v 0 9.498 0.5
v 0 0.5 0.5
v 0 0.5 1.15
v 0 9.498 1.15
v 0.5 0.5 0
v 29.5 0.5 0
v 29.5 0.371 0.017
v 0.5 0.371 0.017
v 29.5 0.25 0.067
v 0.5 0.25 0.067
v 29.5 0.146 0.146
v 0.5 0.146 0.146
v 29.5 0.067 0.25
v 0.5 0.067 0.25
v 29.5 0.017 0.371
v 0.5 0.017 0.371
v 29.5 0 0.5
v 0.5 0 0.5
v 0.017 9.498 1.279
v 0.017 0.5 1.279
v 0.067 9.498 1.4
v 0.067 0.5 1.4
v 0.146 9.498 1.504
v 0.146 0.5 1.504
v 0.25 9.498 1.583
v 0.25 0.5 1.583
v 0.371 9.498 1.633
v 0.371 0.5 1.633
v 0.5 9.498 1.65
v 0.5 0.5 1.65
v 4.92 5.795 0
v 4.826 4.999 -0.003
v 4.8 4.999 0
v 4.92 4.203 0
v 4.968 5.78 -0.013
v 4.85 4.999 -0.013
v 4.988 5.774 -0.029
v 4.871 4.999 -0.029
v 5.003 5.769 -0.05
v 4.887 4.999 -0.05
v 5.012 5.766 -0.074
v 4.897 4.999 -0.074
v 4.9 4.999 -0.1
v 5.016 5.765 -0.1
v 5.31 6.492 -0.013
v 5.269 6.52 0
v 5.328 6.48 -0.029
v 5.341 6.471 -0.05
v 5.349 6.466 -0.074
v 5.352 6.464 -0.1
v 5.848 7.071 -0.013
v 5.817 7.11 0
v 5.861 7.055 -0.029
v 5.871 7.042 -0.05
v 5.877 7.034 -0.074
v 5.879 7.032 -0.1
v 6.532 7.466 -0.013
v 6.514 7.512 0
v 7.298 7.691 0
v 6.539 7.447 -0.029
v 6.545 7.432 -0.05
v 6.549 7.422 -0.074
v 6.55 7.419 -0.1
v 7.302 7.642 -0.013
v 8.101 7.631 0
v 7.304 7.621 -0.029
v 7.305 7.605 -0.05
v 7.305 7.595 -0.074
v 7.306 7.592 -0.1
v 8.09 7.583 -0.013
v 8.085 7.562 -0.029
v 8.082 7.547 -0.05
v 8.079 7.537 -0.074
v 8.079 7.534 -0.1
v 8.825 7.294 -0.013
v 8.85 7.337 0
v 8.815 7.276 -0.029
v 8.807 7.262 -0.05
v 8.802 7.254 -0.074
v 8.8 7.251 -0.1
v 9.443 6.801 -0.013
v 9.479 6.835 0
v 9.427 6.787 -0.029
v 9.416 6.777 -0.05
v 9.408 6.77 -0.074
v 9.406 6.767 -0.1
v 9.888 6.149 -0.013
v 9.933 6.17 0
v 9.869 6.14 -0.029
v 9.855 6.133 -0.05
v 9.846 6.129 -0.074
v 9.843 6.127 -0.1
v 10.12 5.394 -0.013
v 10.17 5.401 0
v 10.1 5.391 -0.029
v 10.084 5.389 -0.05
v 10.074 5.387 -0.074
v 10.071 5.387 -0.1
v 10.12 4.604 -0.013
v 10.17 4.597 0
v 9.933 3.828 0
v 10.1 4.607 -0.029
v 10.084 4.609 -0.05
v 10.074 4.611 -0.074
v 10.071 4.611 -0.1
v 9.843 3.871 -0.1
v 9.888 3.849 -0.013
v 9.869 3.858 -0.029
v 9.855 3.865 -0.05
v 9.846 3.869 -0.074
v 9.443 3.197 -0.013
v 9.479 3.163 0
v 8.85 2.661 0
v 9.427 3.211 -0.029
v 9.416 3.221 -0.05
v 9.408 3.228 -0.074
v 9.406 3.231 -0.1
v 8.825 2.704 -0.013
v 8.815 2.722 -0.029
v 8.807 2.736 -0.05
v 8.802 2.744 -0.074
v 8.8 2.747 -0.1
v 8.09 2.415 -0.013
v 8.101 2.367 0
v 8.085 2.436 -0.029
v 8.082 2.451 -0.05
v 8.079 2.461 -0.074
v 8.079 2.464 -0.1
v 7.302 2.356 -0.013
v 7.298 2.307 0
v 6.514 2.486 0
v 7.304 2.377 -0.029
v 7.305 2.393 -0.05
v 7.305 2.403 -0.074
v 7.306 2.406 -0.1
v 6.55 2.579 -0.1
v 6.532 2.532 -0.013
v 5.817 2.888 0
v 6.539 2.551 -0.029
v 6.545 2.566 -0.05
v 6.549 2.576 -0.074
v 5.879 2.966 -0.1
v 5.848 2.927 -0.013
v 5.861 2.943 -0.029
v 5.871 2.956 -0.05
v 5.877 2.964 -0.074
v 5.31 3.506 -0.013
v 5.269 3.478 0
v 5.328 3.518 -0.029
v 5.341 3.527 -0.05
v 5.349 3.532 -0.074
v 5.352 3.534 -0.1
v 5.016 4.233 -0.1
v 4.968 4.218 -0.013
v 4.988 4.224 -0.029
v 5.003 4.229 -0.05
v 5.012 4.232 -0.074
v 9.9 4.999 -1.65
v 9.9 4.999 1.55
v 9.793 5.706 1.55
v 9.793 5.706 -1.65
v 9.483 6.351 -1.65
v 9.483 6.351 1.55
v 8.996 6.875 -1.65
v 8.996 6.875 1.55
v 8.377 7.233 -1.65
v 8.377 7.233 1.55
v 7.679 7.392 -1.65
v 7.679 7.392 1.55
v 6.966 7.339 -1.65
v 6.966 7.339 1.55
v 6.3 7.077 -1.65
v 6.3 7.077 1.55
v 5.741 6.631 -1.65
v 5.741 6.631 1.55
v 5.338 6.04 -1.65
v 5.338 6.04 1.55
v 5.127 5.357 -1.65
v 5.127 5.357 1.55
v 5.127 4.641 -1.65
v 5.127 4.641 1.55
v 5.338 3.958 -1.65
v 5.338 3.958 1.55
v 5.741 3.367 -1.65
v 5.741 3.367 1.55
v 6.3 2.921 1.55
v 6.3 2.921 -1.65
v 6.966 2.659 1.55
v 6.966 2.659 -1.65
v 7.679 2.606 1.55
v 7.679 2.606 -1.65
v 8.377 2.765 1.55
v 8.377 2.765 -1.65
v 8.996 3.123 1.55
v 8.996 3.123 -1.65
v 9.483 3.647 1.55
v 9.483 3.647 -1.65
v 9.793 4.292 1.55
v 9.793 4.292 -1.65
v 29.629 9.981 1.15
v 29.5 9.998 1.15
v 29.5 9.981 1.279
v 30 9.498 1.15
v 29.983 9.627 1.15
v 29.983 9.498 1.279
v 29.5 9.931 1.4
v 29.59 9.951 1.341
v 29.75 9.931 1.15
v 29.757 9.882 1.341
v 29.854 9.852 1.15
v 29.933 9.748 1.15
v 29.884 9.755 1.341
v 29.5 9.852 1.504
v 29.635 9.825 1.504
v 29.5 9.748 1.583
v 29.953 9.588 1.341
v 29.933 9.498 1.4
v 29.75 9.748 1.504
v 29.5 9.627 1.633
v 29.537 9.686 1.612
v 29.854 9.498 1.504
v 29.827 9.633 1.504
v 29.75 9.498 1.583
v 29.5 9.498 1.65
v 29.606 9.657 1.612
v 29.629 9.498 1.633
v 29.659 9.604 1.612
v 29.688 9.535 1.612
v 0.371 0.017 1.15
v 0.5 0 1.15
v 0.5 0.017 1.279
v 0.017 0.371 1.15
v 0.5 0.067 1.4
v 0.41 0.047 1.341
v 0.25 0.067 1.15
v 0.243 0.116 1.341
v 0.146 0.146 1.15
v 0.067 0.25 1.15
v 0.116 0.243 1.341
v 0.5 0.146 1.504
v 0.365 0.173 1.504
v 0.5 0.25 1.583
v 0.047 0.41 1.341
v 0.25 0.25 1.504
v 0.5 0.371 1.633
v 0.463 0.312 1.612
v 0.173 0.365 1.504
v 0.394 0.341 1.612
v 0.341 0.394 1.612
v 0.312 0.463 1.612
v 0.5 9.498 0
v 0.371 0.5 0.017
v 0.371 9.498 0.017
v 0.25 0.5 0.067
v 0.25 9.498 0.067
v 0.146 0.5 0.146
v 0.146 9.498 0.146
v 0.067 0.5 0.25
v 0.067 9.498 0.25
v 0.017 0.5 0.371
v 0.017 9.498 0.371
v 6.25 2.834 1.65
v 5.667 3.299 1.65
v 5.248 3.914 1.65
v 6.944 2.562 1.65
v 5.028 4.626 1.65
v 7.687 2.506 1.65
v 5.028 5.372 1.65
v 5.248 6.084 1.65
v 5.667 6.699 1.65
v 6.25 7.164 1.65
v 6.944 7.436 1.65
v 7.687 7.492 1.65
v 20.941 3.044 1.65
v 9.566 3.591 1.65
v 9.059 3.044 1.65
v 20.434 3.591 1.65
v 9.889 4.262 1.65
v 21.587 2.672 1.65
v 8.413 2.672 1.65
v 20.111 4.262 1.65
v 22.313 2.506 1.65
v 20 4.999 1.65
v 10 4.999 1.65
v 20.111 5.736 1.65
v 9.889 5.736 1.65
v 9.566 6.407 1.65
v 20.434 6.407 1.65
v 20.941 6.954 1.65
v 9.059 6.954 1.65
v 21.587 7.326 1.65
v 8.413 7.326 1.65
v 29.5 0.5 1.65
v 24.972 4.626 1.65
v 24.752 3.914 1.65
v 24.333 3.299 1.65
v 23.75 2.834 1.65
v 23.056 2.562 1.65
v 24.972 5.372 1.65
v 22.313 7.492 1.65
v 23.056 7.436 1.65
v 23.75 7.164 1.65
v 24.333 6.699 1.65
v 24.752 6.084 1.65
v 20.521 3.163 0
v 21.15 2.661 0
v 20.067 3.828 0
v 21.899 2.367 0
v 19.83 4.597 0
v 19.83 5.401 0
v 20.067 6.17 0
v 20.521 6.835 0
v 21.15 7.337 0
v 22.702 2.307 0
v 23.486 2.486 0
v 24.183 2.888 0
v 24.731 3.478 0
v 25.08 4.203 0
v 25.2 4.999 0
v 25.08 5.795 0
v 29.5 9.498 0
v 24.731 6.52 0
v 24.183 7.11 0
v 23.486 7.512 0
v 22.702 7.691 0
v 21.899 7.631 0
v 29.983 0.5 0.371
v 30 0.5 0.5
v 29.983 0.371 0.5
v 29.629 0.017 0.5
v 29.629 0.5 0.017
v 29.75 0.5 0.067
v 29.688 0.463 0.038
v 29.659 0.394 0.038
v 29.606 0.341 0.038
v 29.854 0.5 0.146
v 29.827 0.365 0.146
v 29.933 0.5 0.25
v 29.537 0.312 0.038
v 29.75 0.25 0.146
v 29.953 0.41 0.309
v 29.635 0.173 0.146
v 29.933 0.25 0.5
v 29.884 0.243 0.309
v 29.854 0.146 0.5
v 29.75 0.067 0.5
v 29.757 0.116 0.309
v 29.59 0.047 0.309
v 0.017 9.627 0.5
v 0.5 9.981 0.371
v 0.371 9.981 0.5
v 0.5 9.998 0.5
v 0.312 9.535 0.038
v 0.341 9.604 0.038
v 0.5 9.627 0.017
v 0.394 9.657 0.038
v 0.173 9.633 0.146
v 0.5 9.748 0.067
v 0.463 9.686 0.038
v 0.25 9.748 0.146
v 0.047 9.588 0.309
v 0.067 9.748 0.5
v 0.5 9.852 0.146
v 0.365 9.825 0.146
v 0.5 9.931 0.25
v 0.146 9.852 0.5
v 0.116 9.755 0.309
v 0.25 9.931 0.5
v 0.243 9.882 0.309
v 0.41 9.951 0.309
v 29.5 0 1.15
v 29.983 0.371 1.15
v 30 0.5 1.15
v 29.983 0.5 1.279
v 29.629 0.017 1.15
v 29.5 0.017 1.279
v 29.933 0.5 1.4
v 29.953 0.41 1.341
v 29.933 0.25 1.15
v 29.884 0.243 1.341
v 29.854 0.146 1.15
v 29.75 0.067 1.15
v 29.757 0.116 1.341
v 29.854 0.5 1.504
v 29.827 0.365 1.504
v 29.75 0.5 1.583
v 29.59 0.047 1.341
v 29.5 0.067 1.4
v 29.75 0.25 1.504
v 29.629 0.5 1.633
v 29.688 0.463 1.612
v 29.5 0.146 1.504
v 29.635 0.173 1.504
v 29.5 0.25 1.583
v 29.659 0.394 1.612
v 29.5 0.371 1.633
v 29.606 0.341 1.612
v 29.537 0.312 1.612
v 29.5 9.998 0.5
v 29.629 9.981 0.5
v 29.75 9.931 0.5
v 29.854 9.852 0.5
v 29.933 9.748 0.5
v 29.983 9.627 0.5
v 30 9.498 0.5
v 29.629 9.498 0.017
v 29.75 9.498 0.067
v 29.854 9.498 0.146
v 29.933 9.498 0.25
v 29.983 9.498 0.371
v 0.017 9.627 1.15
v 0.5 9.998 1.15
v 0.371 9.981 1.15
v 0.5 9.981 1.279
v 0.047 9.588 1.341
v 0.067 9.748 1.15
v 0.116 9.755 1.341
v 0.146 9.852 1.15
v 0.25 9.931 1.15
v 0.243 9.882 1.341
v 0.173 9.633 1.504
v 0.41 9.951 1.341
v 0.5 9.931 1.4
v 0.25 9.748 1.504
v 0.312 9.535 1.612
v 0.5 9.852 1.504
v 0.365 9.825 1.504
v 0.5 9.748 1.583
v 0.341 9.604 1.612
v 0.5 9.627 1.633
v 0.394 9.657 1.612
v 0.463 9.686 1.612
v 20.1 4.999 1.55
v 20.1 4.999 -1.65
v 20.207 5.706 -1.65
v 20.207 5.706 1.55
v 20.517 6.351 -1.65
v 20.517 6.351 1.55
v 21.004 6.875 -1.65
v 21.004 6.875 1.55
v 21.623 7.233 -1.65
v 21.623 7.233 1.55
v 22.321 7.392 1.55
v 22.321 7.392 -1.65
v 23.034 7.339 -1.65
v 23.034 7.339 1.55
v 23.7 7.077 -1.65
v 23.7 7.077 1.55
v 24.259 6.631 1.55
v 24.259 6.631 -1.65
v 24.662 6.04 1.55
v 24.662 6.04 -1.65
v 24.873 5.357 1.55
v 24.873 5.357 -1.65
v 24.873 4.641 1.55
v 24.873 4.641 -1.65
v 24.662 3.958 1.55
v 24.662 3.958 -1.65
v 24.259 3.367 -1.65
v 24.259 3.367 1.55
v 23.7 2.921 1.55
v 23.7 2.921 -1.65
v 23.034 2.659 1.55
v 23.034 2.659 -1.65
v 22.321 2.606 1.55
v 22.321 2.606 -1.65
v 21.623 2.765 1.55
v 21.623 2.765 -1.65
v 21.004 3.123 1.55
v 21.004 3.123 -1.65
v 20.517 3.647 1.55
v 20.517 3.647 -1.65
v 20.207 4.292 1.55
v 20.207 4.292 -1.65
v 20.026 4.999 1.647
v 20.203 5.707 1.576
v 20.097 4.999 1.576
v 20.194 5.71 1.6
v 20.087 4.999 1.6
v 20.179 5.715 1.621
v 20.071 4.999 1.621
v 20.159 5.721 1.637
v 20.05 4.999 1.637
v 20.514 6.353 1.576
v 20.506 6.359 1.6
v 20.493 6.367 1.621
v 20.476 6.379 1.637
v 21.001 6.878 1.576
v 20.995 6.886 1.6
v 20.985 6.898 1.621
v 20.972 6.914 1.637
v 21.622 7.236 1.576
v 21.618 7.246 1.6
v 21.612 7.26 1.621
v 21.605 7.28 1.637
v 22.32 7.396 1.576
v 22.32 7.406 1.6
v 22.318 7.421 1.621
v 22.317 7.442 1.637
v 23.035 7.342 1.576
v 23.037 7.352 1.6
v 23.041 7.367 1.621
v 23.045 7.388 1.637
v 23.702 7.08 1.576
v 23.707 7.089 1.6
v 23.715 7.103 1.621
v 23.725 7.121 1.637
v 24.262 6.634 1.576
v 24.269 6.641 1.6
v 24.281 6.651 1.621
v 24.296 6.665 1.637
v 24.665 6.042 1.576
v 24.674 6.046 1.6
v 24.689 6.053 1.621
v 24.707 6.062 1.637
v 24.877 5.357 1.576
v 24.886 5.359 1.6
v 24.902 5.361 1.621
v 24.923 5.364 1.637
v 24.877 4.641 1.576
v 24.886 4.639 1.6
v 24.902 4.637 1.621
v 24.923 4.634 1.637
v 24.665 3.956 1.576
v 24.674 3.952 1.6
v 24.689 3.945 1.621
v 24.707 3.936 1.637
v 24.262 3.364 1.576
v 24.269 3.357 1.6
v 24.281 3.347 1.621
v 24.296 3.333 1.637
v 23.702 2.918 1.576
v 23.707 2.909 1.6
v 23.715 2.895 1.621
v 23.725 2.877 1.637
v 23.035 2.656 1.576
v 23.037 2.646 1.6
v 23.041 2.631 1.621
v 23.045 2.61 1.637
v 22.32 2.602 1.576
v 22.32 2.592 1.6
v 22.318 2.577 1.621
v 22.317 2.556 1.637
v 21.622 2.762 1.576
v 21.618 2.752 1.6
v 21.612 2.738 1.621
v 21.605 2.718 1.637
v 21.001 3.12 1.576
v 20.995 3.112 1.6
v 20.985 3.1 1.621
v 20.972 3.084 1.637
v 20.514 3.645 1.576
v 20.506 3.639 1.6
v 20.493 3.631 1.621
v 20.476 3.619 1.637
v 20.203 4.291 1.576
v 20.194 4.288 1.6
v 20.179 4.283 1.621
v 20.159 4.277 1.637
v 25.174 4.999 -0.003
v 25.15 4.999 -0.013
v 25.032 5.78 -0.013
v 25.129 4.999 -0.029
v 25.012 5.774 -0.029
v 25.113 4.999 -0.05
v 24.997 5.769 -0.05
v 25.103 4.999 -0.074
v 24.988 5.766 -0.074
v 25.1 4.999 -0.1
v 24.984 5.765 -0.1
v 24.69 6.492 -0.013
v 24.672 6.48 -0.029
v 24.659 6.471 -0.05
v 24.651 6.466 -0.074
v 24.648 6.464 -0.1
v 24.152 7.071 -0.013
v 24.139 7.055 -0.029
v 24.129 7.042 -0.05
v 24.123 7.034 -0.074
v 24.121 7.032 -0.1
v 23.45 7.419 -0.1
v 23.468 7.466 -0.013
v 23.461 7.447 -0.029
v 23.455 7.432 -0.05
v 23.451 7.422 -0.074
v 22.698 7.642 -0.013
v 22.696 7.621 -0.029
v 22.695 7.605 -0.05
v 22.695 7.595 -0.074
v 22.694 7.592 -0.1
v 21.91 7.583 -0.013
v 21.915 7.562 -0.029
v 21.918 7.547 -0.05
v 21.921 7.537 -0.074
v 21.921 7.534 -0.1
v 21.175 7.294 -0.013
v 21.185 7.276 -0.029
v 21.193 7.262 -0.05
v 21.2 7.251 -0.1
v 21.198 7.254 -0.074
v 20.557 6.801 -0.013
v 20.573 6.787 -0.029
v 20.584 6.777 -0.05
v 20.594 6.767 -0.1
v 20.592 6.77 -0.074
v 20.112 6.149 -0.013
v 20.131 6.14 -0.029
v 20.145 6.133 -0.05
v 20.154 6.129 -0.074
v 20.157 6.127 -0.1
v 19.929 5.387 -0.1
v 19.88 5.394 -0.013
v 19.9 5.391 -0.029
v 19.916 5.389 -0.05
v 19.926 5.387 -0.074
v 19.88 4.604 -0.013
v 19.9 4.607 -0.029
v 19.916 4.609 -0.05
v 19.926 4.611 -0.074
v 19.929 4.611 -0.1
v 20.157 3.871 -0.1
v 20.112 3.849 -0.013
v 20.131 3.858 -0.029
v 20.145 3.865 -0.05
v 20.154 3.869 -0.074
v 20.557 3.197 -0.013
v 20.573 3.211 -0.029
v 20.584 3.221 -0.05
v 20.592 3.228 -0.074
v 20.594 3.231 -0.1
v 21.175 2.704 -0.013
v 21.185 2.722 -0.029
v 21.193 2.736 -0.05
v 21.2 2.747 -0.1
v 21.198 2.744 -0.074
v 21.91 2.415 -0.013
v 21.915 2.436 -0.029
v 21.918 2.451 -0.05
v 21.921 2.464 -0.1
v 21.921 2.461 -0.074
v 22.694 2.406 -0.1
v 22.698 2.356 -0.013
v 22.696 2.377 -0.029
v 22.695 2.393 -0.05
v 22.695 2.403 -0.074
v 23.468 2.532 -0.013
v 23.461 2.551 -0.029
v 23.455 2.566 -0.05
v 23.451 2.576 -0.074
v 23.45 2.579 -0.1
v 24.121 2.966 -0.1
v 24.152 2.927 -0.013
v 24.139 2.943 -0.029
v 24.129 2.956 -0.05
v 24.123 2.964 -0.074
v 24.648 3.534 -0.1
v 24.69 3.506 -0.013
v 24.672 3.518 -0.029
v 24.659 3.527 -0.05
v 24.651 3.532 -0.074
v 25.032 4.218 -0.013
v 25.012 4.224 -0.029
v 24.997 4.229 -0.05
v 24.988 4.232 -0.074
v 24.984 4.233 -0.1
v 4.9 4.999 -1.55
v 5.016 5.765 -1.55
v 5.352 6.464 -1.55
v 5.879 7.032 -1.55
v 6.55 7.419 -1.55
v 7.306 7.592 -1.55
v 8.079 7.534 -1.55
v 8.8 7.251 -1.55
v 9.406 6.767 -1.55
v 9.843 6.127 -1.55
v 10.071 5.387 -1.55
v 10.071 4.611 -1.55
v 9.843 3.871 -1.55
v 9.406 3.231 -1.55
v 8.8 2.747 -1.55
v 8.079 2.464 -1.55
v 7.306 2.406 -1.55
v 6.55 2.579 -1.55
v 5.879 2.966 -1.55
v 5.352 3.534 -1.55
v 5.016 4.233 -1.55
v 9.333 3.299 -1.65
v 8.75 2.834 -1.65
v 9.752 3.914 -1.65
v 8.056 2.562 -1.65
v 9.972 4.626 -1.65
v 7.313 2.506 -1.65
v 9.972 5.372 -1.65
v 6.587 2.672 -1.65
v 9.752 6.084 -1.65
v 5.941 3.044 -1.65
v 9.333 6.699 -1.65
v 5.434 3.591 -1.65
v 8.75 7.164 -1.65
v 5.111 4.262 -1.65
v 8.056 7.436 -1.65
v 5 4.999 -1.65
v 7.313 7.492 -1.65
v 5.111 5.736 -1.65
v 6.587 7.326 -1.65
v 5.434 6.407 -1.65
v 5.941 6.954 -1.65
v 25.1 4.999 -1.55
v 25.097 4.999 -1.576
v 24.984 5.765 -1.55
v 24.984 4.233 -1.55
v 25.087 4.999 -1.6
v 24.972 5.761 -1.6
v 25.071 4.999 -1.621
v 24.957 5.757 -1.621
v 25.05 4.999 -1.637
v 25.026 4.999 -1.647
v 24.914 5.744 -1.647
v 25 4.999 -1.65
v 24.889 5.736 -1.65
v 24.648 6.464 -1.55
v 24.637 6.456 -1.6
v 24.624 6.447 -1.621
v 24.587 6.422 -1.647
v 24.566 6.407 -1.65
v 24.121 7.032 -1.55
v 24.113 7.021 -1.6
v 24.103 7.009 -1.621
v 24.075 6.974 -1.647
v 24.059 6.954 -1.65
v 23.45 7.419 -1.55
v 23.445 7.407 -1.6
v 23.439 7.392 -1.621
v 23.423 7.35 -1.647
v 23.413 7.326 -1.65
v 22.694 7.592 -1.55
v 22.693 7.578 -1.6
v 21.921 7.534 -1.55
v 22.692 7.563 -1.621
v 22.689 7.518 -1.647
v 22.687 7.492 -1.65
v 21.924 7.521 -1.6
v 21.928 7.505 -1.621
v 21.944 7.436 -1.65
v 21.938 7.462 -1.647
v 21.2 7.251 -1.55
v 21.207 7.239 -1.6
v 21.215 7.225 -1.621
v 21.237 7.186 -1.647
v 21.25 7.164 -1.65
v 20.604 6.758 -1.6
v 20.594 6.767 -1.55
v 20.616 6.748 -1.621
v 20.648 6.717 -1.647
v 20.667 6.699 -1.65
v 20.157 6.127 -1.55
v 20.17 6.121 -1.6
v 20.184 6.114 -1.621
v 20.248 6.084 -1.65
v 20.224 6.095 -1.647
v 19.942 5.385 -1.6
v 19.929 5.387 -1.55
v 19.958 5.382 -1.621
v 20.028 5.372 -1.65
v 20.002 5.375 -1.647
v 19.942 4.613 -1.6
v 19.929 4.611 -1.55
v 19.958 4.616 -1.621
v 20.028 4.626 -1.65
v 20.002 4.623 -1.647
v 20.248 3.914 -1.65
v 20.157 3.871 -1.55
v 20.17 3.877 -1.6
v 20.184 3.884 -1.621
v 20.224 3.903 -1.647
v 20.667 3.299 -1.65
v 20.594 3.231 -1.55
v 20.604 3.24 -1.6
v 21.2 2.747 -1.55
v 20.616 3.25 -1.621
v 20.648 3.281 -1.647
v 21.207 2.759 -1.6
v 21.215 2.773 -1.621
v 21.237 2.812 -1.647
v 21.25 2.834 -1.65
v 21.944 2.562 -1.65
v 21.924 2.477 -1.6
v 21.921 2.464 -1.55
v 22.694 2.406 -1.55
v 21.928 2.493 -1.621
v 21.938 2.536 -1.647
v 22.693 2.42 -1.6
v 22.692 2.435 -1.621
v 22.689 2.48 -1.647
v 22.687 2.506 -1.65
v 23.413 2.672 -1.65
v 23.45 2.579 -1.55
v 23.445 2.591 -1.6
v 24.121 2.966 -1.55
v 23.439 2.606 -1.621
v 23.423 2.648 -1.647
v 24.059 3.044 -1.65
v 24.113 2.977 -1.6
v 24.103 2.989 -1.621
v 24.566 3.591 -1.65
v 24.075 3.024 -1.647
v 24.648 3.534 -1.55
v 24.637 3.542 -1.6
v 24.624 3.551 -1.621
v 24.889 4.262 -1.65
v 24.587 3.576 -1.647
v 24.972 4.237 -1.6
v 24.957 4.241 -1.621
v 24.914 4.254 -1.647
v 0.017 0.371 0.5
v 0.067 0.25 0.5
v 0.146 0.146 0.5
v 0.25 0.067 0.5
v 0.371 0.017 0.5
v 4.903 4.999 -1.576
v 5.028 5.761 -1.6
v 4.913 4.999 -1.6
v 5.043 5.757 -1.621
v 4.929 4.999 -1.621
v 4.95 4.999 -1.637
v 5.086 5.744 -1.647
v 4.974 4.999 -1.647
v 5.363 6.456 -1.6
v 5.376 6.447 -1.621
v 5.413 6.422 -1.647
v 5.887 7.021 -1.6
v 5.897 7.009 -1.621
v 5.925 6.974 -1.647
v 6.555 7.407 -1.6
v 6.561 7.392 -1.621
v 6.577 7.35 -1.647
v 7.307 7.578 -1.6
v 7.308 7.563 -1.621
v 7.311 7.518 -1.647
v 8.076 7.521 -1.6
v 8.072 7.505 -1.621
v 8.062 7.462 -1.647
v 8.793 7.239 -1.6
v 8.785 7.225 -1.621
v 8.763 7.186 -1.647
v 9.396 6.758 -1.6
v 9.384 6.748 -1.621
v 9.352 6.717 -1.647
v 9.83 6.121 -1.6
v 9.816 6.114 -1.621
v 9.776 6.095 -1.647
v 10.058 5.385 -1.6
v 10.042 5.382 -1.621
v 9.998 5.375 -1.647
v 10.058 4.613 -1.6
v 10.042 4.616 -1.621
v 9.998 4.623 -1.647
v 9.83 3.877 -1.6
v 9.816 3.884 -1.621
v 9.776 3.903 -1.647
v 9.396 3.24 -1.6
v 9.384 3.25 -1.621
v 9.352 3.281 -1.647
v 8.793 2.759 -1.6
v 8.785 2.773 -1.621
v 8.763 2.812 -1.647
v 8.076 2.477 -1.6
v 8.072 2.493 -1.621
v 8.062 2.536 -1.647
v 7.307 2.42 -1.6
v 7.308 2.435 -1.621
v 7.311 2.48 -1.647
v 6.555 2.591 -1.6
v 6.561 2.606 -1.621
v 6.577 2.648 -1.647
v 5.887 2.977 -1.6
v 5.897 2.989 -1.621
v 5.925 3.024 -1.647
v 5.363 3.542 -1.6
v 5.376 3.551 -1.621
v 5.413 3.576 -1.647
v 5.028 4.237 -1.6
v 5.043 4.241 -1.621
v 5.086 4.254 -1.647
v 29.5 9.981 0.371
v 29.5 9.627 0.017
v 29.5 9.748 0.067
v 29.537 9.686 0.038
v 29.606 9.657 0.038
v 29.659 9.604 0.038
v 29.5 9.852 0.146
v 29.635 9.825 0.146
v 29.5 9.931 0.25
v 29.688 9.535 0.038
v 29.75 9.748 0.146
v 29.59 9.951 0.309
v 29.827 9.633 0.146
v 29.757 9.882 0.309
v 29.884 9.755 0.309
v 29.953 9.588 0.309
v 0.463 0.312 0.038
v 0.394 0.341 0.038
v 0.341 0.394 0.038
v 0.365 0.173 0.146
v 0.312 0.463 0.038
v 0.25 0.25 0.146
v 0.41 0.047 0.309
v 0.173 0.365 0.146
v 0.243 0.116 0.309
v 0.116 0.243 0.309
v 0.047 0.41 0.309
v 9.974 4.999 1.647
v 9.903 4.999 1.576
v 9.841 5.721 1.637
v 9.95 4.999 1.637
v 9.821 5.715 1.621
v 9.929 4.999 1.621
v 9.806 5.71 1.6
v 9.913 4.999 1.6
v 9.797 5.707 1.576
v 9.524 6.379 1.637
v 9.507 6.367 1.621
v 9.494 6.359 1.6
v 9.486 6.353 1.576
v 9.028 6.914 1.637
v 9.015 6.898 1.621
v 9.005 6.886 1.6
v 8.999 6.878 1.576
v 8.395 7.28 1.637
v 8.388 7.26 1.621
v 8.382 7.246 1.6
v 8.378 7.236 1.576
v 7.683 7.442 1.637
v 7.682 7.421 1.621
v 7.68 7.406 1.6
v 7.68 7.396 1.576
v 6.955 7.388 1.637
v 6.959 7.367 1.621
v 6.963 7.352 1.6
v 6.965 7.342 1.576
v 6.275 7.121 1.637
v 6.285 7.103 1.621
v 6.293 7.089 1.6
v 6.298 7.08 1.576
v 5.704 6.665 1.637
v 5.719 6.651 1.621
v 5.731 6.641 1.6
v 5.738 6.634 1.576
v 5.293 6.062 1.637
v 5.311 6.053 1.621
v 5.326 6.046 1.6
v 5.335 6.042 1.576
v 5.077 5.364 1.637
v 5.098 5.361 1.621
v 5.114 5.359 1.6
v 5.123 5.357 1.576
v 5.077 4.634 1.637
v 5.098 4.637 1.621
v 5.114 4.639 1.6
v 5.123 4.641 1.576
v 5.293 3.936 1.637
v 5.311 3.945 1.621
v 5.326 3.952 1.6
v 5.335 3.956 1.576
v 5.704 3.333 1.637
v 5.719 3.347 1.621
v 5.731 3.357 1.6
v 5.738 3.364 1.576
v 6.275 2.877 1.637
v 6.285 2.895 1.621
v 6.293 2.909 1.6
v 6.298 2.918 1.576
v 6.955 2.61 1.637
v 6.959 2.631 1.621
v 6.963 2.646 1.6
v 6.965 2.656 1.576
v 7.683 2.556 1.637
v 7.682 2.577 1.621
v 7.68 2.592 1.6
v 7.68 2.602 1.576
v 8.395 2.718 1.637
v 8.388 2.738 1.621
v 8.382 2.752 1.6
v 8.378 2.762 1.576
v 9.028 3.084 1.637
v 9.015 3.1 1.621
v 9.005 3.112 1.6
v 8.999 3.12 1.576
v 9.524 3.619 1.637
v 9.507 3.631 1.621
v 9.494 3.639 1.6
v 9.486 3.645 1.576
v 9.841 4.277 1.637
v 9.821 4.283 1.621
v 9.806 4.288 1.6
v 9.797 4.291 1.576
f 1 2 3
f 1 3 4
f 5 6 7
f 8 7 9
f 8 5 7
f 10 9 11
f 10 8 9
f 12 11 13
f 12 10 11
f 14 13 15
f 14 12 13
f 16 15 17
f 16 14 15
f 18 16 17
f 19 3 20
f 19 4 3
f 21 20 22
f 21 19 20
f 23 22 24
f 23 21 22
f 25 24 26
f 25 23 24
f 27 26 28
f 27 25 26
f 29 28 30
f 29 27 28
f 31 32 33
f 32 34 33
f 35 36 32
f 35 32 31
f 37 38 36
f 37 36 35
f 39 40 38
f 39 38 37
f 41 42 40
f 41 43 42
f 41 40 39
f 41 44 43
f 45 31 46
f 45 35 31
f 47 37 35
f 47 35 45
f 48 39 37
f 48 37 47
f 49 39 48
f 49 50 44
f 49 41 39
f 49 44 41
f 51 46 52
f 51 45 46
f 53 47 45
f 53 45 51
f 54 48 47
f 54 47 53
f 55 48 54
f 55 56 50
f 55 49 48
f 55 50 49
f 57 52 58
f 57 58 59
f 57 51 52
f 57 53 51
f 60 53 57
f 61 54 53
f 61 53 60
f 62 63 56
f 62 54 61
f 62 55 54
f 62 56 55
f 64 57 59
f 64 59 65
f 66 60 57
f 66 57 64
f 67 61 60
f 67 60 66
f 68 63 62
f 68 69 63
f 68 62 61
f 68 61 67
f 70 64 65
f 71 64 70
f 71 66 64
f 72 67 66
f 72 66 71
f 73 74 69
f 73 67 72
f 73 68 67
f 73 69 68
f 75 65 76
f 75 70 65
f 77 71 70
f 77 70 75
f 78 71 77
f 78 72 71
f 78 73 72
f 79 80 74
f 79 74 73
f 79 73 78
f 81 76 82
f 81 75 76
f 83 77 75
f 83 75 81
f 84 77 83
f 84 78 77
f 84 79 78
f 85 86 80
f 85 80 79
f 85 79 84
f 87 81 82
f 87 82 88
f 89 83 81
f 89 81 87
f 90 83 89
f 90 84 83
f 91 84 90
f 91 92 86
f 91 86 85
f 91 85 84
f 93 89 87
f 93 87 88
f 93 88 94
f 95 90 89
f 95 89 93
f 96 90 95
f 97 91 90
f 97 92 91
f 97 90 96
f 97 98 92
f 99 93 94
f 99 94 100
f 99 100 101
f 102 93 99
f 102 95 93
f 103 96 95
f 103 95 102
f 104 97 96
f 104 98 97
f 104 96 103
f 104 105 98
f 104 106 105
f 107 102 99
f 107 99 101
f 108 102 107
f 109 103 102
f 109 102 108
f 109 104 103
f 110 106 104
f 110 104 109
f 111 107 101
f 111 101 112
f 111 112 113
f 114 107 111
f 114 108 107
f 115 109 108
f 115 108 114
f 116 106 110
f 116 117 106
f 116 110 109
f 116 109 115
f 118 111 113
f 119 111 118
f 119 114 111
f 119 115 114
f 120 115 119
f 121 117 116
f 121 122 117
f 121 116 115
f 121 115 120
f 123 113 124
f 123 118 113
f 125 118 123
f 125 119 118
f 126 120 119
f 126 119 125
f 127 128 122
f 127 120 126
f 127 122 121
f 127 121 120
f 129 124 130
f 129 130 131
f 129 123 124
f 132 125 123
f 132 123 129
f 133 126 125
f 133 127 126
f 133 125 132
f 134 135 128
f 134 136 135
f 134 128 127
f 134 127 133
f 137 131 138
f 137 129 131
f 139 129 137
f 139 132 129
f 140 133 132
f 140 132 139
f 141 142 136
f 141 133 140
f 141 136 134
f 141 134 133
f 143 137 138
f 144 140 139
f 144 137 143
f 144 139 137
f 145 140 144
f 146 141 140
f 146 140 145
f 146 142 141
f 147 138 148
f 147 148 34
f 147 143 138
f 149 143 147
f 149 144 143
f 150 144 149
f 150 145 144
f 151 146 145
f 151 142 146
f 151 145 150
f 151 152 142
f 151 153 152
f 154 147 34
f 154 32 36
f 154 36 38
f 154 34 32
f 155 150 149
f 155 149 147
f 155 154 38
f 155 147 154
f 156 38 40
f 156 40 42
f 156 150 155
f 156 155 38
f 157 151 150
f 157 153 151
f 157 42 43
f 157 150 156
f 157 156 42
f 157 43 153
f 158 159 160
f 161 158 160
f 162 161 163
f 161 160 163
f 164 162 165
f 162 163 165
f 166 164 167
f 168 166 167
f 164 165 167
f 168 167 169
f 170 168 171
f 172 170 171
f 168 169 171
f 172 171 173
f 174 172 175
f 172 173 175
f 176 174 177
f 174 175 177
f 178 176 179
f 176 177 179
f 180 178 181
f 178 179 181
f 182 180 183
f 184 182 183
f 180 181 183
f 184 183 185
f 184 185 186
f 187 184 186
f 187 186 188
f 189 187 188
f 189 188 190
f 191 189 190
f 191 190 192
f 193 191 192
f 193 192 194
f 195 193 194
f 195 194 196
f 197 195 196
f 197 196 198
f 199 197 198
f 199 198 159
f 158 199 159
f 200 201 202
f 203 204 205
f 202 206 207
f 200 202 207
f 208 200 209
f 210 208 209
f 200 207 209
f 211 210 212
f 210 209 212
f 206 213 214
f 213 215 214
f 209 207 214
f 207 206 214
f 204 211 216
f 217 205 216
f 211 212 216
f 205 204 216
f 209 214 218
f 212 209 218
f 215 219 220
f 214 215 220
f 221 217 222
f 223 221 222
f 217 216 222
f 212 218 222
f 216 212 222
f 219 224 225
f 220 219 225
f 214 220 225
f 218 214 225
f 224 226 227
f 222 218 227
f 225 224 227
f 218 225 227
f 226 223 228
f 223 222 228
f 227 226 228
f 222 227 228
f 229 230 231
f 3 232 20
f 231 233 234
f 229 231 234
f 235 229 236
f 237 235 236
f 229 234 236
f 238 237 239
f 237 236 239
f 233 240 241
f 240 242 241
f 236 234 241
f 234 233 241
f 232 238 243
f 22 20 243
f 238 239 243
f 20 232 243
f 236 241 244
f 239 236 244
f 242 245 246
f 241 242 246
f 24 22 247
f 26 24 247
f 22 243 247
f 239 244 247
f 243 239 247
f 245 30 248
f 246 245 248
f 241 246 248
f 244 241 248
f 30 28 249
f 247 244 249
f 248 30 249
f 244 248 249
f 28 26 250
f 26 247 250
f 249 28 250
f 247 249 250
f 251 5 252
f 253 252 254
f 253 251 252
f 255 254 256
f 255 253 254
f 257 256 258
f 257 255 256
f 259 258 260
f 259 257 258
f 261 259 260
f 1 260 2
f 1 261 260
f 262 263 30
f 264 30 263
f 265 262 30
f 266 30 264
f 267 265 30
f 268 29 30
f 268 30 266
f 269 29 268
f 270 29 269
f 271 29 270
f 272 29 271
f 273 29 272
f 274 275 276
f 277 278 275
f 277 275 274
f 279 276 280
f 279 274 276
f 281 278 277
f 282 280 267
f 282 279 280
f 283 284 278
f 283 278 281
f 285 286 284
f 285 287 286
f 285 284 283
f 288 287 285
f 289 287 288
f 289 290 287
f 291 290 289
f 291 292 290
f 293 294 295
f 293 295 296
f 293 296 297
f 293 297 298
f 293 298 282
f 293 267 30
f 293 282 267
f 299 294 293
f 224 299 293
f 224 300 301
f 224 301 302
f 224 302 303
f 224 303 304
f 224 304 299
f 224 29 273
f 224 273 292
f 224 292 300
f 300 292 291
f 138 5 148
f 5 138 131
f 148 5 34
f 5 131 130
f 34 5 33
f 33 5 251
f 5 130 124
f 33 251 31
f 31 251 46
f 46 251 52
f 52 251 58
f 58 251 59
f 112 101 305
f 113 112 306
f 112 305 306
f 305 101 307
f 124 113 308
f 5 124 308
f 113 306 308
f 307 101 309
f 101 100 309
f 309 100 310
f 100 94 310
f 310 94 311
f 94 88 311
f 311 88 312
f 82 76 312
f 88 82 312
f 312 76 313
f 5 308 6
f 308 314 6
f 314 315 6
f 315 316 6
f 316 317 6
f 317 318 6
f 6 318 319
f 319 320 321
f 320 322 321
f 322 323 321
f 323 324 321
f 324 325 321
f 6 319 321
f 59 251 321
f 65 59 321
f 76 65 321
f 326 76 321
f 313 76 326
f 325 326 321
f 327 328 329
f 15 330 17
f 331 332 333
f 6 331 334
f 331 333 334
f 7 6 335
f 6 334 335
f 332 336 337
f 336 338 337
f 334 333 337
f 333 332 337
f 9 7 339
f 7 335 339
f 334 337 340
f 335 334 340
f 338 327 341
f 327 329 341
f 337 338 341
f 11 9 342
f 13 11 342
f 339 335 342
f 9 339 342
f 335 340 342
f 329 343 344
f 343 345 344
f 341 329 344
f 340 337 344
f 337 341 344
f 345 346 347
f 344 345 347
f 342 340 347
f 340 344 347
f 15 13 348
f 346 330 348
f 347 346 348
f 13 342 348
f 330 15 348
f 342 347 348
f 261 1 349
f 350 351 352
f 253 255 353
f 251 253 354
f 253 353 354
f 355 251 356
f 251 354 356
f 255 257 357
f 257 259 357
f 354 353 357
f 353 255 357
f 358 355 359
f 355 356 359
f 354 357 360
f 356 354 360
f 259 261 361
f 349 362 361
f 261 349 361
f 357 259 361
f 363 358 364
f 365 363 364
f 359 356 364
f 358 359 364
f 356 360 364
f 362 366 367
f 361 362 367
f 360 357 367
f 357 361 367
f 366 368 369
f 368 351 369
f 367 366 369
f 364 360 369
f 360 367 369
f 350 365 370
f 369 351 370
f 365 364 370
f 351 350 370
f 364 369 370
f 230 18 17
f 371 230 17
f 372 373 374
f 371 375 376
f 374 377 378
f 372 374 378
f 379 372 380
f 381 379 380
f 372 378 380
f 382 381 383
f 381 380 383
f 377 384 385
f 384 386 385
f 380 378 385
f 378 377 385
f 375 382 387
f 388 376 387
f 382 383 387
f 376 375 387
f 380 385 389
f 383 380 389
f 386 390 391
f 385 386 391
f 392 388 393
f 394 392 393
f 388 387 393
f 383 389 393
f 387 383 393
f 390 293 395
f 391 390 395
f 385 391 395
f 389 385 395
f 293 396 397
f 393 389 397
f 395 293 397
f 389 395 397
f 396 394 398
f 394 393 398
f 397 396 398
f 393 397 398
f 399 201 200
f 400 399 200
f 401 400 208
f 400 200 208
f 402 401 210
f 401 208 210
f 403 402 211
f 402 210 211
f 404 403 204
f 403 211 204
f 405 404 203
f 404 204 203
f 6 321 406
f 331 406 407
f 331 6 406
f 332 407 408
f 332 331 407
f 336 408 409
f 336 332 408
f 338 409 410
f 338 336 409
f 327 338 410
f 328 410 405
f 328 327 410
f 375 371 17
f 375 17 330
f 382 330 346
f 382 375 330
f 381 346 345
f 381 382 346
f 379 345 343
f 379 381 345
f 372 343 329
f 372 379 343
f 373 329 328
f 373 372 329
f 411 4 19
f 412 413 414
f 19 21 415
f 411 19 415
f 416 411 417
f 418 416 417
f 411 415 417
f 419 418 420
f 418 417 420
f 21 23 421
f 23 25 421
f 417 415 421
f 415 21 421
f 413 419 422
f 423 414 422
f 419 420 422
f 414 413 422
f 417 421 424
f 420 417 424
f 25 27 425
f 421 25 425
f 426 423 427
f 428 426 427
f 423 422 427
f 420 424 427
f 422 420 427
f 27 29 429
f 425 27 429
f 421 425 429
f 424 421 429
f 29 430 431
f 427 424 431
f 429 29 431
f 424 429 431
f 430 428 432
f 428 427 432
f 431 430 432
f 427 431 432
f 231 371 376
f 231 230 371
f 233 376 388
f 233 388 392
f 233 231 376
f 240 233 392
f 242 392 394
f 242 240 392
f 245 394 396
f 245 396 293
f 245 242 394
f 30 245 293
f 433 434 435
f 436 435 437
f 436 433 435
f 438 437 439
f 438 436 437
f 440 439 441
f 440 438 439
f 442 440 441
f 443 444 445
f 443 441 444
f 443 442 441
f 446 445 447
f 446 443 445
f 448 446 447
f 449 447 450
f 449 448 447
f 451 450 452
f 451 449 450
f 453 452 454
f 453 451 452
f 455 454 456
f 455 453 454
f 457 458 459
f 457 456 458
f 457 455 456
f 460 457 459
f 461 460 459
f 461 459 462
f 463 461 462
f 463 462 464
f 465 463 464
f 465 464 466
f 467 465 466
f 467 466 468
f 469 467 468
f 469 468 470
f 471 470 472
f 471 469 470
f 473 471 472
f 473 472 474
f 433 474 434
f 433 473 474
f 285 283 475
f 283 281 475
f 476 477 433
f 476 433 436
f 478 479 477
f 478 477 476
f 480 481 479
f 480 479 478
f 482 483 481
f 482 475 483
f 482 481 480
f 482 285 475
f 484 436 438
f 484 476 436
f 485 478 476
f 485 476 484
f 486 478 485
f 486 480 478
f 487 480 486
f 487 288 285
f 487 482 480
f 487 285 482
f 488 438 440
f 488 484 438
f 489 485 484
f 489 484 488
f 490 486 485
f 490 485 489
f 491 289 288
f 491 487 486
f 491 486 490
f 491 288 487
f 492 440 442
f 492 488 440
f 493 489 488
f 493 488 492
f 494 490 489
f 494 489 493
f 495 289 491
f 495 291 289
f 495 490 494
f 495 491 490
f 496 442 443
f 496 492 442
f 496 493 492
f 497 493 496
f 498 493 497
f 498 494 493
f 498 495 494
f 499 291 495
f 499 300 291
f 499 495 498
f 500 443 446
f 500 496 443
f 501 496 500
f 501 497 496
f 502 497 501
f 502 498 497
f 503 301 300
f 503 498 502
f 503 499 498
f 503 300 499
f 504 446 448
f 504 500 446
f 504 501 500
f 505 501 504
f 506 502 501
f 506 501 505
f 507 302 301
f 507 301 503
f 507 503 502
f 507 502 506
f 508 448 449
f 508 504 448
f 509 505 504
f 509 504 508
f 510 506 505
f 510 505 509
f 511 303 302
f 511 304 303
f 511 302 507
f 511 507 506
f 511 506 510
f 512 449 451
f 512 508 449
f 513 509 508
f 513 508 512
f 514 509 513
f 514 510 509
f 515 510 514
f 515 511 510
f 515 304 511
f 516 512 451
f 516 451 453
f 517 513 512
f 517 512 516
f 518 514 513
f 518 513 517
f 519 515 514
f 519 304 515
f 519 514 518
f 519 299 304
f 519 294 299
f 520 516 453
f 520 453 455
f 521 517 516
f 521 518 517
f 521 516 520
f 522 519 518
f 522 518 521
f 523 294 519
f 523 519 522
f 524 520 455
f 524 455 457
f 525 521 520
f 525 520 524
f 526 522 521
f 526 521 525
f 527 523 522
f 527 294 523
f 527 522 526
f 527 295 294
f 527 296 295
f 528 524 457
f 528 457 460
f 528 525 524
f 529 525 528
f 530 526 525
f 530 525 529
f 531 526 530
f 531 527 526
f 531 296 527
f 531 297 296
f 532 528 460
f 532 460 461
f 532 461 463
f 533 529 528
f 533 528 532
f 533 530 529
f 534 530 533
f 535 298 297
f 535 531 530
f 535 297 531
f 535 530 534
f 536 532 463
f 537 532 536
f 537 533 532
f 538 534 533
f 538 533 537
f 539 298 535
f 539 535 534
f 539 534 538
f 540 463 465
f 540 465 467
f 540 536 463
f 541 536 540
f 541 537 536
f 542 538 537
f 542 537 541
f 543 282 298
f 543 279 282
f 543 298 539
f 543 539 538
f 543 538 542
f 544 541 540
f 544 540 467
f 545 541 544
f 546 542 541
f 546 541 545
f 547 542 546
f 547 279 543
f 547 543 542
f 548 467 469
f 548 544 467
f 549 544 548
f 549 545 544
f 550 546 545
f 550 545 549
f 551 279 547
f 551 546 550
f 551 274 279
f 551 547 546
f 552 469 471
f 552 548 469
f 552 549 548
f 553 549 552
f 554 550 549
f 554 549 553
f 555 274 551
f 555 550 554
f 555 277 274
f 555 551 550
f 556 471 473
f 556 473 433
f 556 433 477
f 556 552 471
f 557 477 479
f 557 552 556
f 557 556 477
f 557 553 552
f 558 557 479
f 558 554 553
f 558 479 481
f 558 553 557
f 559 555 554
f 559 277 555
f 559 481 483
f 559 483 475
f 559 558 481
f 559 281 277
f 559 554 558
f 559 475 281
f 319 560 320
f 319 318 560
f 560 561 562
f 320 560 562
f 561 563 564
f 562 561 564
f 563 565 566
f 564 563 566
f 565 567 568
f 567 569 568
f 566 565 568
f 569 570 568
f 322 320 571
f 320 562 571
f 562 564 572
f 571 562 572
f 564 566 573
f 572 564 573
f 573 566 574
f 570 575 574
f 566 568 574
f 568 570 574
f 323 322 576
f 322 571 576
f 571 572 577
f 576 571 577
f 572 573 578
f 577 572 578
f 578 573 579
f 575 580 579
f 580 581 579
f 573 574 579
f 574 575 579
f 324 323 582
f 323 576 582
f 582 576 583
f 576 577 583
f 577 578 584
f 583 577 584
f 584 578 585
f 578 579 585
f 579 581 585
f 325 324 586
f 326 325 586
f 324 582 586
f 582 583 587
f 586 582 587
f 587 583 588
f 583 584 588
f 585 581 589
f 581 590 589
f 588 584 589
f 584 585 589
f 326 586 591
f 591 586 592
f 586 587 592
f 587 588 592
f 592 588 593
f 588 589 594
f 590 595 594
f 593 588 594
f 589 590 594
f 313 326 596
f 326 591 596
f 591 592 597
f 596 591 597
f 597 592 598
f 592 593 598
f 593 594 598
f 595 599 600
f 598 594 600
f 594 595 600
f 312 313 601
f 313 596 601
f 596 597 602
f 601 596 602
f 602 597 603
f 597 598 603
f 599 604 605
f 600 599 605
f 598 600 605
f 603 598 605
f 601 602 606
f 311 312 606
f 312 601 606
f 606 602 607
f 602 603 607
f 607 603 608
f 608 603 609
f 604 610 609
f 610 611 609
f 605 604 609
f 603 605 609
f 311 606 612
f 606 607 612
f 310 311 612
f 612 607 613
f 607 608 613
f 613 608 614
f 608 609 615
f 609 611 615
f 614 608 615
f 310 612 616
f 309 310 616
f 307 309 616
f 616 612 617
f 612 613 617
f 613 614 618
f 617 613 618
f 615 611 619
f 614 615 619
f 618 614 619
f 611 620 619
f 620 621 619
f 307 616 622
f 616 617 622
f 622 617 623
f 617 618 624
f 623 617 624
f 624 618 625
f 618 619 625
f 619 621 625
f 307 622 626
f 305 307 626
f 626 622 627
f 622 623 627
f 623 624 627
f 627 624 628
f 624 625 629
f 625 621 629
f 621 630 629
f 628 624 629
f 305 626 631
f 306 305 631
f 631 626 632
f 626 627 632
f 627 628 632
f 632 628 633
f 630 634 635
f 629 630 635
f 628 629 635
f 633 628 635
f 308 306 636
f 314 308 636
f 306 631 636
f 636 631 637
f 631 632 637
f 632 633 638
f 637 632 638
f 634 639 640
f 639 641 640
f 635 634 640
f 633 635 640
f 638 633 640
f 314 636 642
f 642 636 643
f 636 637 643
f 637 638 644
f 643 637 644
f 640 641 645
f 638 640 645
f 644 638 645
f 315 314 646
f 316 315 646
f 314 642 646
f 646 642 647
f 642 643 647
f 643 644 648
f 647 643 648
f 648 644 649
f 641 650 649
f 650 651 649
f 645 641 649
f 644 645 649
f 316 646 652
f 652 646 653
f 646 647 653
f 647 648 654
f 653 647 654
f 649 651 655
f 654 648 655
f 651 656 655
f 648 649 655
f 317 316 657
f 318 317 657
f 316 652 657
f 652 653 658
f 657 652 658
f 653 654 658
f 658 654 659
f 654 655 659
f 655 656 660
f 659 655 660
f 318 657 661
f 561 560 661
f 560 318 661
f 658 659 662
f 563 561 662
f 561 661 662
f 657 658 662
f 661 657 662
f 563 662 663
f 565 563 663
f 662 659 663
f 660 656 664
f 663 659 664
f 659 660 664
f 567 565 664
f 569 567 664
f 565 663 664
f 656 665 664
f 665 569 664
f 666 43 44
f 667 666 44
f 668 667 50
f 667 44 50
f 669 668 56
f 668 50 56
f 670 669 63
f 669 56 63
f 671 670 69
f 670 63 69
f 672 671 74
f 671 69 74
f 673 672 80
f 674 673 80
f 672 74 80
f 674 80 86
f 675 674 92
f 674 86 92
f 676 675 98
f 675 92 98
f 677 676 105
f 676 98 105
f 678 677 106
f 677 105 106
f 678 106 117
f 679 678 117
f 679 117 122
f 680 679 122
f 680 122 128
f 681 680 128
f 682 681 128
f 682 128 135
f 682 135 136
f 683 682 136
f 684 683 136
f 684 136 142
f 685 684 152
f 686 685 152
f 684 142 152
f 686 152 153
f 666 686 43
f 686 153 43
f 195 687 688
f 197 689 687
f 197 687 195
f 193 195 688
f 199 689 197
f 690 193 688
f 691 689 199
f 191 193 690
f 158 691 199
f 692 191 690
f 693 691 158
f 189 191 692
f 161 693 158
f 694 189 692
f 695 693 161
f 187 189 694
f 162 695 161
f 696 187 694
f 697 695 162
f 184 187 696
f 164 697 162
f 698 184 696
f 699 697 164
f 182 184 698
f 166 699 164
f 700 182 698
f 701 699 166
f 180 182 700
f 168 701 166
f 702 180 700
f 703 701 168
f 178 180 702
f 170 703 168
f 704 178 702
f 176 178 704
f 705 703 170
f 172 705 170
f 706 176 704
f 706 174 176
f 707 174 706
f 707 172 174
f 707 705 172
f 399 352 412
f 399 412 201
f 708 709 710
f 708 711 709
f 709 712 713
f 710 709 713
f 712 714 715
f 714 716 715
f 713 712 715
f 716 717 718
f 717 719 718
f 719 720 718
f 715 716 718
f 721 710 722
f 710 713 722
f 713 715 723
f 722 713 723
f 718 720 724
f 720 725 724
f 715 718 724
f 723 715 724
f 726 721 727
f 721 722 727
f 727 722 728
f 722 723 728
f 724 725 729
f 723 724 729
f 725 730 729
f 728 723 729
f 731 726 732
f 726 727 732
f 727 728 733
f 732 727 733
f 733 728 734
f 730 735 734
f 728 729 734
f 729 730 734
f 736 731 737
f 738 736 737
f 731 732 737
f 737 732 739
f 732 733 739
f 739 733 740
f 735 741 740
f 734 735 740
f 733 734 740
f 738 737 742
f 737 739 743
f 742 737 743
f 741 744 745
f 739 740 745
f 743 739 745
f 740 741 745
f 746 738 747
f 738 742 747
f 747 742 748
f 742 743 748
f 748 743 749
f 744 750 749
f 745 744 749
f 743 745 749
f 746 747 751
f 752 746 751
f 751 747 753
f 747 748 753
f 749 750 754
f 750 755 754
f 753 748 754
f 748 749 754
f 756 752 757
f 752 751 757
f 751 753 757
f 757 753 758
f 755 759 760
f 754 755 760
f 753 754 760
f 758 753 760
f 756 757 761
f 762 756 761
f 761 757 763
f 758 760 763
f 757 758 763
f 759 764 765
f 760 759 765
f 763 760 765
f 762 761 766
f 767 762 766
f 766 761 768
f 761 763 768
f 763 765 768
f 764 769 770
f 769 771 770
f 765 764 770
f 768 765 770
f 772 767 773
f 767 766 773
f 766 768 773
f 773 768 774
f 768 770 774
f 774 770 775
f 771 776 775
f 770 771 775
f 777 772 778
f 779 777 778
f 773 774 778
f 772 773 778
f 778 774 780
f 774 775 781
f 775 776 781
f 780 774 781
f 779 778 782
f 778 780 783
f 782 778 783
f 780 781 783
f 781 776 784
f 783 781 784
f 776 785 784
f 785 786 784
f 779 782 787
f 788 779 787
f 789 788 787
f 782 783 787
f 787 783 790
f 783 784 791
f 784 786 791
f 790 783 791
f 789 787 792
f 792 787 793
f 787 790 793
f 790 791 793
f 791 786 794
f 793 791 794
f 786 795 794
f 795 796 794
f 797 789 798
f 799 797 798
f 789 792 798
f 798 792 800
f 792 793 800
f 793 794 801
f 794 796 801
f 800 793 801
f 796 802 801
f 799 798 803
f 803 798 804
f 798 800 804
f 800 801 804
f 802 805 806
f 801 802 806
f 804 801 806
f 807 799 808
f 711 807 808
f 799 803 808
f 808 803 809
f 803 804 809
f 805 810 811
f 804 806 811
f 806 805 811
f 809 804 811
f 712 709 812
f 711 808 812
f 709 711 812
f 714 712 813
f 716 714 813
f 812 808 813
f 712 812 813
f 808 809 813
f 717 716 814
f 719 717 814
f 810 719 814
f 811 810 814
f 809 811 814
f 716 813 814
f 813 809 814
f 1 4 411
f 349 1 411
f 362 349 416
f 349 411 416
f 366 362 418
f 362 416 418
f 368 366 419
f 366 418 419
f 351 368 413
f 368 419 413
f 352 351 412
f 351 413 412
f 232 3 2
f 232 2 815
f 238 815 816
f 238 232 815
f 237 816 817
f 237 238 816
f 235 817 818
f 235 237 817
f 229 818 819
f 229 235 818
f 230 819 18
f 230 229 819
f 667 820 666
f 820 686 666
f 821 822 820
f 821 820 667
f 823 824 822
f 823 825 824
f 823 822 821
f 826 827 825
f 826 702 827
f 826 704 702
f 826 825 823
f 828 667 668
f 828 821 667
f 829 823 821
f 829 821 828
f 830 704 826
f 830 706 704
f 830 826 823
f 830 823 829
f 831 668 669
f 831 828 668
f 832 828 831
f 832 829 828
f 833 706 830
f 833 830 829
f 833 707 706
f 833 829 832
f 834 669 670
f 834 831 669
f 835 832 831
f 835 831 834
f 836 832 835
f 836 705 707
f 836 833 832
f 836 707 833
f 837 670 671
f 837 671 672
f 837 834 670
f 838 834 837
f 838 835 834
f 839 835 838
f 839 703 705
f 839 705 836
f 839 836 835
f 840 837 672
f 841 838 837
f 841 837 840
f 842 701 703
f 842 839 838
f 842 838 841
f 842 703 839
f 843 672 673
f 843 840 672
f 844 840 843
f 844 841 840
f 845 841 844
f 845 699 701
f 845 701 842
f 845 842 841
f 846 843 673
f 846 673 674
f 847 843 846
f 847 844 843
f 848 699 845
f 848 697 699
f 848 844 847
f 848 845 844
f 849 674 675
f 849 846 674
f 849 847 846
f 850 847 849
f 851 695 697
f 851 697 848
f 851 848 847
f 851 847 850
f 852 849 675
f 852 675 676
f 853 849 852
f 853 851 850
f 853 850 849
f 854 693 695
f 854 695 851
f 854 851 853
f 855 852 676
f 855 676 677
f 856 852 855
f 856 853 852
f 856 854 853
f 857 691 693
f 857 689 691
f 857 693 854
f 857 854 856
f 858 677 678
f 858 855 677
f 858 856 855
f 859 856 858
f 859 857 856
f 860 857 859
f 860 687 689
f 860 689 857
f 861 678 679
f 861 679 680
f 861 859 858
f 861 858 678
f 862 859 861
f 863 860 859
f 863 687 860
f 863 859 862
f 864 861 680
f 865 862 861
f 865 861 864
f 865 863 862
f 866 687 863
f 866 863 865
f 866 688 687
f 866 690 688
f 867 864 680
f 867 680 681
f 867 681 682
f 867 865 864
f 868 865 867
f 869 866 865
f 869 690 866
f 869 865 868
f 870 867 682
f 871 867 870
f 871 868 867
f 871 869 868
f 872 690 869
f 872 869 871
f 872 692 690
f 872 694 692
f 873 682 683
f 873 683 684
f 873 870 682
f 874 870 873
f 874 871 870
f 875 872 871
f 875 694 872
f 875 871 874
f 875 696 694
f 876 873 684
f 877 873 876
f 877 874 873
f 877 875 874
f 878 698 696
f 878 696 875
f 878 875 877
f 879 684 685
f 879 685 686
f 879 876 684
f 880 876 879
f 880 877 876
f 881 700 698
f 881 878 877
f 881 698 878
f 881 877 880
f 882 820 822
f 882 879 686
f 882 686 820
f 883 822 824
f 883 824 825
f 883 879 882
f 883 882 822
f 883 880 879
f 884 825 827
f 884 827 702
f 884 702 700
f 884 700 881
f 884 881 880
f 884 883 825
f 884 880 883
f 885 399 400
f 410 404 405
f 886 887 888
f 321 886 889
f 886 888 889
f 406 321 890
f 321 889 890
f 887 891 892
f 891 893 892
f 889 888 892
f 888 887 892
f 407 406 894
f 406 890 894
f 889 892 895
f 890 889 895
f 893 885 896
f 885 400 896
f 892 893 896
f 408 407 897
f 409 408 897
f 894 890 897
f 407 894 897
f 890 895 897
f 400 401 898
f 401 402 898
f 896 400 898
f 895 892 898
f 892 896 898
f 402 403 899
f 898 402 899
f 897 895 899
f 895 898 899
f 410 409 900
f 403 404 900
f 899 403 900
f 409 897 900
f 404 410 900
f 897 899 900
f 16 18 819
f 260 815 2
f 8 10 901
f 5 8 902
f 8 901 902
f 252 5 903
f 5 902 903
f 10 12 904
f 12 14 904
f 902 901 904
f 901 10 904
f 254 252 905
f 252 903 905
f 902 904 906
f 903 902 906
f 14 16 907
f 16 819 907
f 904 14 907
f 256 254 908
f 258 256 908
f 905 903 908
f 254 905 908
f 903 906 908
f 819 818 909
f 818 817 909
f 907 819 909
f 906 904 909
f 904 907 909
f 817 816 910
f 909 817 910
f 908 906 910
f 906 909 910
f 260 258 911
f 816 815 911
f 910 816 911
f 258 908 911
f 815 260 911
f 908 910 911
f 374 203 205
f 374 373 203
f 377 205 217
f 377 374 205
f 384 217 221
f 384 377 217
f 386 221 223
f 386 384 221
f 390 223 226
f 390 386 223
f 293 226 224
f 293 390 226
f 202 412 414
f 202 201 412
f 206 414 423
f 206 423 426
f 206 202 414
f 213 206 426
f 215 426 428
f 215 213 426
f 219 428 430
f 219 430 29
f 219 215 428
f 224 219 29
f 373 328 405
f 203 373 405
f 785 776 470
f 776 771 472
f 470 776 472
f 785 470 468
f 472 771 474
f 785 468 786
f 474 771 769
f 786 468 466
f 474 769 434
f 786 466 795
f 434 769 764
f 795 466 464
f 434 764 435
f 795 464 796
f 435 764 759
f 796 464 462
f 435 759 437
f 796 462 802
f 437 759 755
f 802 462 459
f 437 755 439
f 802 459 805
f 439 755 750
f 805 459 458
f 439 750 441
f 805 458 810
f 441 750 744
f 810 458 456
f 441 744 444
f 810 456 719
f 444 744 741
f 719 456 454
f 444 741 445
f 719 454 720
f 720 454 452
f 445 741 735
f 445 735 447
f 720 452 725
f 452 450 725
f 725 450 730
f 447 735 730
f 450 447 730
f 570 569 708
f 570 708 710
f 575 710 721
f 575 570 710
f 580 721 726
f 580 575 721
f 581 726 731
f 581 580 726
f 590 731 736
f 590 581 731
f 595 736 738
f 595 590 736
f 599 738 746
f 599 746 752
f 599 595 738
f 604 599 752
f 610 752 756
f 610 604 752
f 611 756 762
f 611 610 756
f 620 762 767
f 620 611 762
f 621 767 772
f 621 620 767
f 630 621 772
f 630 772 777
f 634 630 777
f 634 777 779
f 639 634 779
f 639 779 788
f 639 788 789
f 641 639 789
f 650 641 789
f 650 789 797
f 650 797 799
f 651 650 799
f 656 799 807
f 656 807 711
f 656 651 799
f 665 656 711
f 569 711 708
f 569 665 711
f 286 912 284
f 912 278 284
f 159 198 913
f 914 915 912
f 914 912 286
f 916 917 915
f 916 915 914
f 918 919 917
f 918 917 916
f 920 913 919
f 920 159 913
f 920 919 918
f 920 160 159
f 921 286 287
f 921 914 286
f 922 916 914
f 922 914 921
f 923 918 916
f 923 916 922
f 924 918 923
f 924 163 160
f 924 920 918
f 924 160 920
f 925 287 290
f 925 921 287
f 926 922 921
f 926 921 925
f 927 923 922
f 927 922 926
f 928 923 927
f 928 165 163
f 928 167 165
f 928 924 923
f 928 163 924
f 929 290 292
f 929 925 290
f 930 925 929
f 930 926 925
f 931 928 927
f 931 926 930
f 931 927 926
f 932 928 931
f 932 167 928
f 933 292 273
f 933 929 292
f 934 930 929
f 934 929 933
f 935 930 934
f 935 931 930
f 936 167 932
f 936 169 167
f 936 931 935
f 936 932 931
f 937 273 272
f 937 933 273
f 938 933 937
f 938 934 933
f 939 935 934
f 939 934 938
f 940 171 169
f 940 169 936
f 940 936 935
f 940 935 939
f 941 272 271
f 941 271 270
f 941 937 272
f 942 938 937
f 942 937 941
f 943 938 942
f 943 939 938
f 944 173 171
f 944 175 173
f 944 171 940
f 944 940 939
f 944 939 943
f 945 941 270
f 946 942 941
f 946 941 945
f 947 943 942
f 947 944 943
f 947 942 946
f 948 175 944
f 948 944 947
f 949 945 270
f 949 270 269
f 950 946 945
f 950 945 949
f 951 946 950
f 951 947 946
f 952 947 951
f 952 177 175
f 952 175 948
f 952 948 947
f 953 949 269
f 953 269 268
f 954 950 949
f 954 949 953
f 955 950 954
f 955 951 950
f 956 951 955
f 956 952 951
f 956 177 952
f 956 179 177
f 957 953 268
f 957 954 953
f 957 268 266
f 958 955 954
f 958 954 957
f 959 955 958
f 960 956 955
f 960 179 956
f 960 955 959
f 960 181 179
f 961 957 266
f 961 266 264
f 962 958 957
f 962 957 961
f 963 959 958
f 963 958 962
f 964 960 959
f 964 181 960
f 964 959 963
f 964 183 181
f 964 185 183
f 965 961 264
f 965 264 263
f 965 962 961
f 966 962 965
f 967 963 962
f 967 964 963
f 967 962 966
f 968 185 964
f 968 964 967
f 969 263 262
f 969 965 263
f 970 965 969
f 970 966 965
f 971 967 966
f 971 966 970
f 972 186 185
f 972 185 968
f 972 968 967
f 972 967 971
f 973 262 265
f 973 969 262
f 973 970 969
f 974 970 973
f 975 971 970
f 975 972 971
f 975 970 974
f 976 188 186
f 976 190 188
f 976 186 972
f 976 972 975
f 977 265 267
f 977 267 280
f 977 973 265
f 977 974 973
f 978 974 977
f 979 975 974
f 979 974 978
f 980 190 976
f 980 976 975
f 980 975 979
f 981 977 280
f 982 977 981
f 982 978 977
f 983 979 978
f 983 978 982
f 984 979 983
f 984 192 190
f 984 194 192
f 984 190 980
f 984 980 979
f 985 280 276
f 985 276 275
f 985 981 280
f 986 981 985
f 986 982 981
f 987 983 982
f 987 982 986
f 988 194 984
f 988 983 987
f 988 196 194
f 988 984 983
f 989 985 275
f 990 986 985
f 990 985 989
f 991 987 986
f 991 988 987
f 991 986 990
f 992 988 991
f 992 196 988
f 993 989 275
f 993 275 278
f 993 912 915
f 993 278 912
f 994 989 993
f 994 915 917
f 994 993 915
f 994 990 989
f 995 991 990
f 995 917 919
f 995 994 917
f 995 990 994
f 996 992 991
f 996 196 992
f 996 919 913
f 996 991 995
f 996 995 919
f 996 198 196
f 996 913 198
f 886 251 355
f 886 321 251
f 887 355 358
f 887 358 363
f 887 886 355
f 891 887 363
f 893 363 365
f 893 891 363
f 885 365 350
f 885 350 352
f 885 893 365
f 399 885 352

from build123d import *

# Parameters (mm, degrees)
SKETCH1_W            = 30
SKETCH1_H            = 9.998
BOSS_EXTRUDE1_DEPTH  = 1.65
SKETCH2_R            = 2.6
BOSS_EXTRUDE2_DEPTH  = 1.65
SKETCH3_R            = 2.4
CUT_EXTRUDE1_DEPTH   = 4.3
FILLET1_R            = 0.1
FILLET3_R            = 0.5
FILLET4_R            = 0.5
FILLET1_OF_MIRROR2_R = 0.1


with BuildPart() as part:
    # Sketch1 → Boss-Extrude1 (new body)
    with BuildSketch(Plane.XY):
        with Locations((15, 4.999)):
            Rectangle(SKETCH1_W, SKETCH1_H)
    extrude(amount=BOSS_EXTRUDE1_DEPTH)

    # Sketch2 → Boss-Extrude2 (add)
    with BuildSketch(Plane(origin=(0, 0, 0), x_dir=(-1, 0, 0), z_dir=(0, 0, -1))):
        with Locations((-7.5, 4.999)):
            Circle(SKETCH2_R)
    boss_extrude2 = extrude(amount=BOSS_EXTRUDE2_DEPTH)

    # Sketch3 → Cut-Extrude1 (cut, through all)
    with BuildSketch(Plane.XY.offset(1.65)):
        with Locations((7.5, 4.999)):
            Circle(SKETCH3_R)
    cut_extrude1 = extrude(amount=-CUT_EXTRUDE1_DEPTH, mode=Mode.SUBTRACT)

    # Fillet1
    fillet1_edges = [part.edges().sort_by_distance(p)[0] for p in [
        (10.1, 4.999, 0),
        (10.1, 4.999, -1.65),
        (5.1, 4.999, 1.65),
    ]]
    fillet(fillet1_edges, radius=FILLET1_R)

    # Fillet3
    fillet3_edges = [part.edges().sort_by_distance(p)[0] for p in [
        (0, 0, 0.825),
        (0, 9.998, 0.825),
        (30, 9.998, 0.825),
        (30, 0, 0.825),
    ]]
    fillet(fillet3_edges, radius=FILLET3_R)

    # Fillet4
    fillet4_edges = [part.edges().sort_by_distance(p)[0] for p in [
        (15, 9.998, 0),
        (15, 9.998, 1.65),
        (15, 0, 0),
        (0, 4.999, 0),
        (30, 4.999, 0),
        (0.146446609, 0.146446609, 0),
        (0.146446609, 9.851553391, 0),
        (29.853553391, 0.146446609, 0),
        (29.853553391, 9.851553391, 0),
        (30, 4.999, 1.65),
        (15, 0, 1.65),
        (0, 4.999, 1.65),
        (0.146446609, 0.146446609, 1.65),
        (0.146446609, 9.851553391, 1.65),
        (29.853553391, 0.146446609, 1.65),
        (29.853553391, 9.851553391, 1.65),
    ]]
    fillet(fillet4_edges, radius=FILLET4_R)

    # Mirror2: Boss-Extrude2, Cut-Extrude1 across plane
    add(boss_extrude2.mirror(Plane(origin=(15, 0, 0), x_dir=(0, 0, 1), z_dir=(1, 0, 0))))
    add(cut_extrude1.mirror(Plane(origin=(15, 0, 0), x_dir=(0, 0, 1), z_dir=(1, 0, 0))), mode=Mode.SUBTRACT)

    # Fillet1 of Mirror2
    fillet1_of_mirror2_edges = [part.edges().sort_by_distance(p)[0] for p in [
        (19.9, 4.999, 0),
        (19.9, 4.999, -1.65),
        (24.9, 4.999, 1.65),
    ]]
    fillet(fillet1_of_mirror2_edges, radius=FILLET1_OF_MIRROR2_R)


solid = part.part
